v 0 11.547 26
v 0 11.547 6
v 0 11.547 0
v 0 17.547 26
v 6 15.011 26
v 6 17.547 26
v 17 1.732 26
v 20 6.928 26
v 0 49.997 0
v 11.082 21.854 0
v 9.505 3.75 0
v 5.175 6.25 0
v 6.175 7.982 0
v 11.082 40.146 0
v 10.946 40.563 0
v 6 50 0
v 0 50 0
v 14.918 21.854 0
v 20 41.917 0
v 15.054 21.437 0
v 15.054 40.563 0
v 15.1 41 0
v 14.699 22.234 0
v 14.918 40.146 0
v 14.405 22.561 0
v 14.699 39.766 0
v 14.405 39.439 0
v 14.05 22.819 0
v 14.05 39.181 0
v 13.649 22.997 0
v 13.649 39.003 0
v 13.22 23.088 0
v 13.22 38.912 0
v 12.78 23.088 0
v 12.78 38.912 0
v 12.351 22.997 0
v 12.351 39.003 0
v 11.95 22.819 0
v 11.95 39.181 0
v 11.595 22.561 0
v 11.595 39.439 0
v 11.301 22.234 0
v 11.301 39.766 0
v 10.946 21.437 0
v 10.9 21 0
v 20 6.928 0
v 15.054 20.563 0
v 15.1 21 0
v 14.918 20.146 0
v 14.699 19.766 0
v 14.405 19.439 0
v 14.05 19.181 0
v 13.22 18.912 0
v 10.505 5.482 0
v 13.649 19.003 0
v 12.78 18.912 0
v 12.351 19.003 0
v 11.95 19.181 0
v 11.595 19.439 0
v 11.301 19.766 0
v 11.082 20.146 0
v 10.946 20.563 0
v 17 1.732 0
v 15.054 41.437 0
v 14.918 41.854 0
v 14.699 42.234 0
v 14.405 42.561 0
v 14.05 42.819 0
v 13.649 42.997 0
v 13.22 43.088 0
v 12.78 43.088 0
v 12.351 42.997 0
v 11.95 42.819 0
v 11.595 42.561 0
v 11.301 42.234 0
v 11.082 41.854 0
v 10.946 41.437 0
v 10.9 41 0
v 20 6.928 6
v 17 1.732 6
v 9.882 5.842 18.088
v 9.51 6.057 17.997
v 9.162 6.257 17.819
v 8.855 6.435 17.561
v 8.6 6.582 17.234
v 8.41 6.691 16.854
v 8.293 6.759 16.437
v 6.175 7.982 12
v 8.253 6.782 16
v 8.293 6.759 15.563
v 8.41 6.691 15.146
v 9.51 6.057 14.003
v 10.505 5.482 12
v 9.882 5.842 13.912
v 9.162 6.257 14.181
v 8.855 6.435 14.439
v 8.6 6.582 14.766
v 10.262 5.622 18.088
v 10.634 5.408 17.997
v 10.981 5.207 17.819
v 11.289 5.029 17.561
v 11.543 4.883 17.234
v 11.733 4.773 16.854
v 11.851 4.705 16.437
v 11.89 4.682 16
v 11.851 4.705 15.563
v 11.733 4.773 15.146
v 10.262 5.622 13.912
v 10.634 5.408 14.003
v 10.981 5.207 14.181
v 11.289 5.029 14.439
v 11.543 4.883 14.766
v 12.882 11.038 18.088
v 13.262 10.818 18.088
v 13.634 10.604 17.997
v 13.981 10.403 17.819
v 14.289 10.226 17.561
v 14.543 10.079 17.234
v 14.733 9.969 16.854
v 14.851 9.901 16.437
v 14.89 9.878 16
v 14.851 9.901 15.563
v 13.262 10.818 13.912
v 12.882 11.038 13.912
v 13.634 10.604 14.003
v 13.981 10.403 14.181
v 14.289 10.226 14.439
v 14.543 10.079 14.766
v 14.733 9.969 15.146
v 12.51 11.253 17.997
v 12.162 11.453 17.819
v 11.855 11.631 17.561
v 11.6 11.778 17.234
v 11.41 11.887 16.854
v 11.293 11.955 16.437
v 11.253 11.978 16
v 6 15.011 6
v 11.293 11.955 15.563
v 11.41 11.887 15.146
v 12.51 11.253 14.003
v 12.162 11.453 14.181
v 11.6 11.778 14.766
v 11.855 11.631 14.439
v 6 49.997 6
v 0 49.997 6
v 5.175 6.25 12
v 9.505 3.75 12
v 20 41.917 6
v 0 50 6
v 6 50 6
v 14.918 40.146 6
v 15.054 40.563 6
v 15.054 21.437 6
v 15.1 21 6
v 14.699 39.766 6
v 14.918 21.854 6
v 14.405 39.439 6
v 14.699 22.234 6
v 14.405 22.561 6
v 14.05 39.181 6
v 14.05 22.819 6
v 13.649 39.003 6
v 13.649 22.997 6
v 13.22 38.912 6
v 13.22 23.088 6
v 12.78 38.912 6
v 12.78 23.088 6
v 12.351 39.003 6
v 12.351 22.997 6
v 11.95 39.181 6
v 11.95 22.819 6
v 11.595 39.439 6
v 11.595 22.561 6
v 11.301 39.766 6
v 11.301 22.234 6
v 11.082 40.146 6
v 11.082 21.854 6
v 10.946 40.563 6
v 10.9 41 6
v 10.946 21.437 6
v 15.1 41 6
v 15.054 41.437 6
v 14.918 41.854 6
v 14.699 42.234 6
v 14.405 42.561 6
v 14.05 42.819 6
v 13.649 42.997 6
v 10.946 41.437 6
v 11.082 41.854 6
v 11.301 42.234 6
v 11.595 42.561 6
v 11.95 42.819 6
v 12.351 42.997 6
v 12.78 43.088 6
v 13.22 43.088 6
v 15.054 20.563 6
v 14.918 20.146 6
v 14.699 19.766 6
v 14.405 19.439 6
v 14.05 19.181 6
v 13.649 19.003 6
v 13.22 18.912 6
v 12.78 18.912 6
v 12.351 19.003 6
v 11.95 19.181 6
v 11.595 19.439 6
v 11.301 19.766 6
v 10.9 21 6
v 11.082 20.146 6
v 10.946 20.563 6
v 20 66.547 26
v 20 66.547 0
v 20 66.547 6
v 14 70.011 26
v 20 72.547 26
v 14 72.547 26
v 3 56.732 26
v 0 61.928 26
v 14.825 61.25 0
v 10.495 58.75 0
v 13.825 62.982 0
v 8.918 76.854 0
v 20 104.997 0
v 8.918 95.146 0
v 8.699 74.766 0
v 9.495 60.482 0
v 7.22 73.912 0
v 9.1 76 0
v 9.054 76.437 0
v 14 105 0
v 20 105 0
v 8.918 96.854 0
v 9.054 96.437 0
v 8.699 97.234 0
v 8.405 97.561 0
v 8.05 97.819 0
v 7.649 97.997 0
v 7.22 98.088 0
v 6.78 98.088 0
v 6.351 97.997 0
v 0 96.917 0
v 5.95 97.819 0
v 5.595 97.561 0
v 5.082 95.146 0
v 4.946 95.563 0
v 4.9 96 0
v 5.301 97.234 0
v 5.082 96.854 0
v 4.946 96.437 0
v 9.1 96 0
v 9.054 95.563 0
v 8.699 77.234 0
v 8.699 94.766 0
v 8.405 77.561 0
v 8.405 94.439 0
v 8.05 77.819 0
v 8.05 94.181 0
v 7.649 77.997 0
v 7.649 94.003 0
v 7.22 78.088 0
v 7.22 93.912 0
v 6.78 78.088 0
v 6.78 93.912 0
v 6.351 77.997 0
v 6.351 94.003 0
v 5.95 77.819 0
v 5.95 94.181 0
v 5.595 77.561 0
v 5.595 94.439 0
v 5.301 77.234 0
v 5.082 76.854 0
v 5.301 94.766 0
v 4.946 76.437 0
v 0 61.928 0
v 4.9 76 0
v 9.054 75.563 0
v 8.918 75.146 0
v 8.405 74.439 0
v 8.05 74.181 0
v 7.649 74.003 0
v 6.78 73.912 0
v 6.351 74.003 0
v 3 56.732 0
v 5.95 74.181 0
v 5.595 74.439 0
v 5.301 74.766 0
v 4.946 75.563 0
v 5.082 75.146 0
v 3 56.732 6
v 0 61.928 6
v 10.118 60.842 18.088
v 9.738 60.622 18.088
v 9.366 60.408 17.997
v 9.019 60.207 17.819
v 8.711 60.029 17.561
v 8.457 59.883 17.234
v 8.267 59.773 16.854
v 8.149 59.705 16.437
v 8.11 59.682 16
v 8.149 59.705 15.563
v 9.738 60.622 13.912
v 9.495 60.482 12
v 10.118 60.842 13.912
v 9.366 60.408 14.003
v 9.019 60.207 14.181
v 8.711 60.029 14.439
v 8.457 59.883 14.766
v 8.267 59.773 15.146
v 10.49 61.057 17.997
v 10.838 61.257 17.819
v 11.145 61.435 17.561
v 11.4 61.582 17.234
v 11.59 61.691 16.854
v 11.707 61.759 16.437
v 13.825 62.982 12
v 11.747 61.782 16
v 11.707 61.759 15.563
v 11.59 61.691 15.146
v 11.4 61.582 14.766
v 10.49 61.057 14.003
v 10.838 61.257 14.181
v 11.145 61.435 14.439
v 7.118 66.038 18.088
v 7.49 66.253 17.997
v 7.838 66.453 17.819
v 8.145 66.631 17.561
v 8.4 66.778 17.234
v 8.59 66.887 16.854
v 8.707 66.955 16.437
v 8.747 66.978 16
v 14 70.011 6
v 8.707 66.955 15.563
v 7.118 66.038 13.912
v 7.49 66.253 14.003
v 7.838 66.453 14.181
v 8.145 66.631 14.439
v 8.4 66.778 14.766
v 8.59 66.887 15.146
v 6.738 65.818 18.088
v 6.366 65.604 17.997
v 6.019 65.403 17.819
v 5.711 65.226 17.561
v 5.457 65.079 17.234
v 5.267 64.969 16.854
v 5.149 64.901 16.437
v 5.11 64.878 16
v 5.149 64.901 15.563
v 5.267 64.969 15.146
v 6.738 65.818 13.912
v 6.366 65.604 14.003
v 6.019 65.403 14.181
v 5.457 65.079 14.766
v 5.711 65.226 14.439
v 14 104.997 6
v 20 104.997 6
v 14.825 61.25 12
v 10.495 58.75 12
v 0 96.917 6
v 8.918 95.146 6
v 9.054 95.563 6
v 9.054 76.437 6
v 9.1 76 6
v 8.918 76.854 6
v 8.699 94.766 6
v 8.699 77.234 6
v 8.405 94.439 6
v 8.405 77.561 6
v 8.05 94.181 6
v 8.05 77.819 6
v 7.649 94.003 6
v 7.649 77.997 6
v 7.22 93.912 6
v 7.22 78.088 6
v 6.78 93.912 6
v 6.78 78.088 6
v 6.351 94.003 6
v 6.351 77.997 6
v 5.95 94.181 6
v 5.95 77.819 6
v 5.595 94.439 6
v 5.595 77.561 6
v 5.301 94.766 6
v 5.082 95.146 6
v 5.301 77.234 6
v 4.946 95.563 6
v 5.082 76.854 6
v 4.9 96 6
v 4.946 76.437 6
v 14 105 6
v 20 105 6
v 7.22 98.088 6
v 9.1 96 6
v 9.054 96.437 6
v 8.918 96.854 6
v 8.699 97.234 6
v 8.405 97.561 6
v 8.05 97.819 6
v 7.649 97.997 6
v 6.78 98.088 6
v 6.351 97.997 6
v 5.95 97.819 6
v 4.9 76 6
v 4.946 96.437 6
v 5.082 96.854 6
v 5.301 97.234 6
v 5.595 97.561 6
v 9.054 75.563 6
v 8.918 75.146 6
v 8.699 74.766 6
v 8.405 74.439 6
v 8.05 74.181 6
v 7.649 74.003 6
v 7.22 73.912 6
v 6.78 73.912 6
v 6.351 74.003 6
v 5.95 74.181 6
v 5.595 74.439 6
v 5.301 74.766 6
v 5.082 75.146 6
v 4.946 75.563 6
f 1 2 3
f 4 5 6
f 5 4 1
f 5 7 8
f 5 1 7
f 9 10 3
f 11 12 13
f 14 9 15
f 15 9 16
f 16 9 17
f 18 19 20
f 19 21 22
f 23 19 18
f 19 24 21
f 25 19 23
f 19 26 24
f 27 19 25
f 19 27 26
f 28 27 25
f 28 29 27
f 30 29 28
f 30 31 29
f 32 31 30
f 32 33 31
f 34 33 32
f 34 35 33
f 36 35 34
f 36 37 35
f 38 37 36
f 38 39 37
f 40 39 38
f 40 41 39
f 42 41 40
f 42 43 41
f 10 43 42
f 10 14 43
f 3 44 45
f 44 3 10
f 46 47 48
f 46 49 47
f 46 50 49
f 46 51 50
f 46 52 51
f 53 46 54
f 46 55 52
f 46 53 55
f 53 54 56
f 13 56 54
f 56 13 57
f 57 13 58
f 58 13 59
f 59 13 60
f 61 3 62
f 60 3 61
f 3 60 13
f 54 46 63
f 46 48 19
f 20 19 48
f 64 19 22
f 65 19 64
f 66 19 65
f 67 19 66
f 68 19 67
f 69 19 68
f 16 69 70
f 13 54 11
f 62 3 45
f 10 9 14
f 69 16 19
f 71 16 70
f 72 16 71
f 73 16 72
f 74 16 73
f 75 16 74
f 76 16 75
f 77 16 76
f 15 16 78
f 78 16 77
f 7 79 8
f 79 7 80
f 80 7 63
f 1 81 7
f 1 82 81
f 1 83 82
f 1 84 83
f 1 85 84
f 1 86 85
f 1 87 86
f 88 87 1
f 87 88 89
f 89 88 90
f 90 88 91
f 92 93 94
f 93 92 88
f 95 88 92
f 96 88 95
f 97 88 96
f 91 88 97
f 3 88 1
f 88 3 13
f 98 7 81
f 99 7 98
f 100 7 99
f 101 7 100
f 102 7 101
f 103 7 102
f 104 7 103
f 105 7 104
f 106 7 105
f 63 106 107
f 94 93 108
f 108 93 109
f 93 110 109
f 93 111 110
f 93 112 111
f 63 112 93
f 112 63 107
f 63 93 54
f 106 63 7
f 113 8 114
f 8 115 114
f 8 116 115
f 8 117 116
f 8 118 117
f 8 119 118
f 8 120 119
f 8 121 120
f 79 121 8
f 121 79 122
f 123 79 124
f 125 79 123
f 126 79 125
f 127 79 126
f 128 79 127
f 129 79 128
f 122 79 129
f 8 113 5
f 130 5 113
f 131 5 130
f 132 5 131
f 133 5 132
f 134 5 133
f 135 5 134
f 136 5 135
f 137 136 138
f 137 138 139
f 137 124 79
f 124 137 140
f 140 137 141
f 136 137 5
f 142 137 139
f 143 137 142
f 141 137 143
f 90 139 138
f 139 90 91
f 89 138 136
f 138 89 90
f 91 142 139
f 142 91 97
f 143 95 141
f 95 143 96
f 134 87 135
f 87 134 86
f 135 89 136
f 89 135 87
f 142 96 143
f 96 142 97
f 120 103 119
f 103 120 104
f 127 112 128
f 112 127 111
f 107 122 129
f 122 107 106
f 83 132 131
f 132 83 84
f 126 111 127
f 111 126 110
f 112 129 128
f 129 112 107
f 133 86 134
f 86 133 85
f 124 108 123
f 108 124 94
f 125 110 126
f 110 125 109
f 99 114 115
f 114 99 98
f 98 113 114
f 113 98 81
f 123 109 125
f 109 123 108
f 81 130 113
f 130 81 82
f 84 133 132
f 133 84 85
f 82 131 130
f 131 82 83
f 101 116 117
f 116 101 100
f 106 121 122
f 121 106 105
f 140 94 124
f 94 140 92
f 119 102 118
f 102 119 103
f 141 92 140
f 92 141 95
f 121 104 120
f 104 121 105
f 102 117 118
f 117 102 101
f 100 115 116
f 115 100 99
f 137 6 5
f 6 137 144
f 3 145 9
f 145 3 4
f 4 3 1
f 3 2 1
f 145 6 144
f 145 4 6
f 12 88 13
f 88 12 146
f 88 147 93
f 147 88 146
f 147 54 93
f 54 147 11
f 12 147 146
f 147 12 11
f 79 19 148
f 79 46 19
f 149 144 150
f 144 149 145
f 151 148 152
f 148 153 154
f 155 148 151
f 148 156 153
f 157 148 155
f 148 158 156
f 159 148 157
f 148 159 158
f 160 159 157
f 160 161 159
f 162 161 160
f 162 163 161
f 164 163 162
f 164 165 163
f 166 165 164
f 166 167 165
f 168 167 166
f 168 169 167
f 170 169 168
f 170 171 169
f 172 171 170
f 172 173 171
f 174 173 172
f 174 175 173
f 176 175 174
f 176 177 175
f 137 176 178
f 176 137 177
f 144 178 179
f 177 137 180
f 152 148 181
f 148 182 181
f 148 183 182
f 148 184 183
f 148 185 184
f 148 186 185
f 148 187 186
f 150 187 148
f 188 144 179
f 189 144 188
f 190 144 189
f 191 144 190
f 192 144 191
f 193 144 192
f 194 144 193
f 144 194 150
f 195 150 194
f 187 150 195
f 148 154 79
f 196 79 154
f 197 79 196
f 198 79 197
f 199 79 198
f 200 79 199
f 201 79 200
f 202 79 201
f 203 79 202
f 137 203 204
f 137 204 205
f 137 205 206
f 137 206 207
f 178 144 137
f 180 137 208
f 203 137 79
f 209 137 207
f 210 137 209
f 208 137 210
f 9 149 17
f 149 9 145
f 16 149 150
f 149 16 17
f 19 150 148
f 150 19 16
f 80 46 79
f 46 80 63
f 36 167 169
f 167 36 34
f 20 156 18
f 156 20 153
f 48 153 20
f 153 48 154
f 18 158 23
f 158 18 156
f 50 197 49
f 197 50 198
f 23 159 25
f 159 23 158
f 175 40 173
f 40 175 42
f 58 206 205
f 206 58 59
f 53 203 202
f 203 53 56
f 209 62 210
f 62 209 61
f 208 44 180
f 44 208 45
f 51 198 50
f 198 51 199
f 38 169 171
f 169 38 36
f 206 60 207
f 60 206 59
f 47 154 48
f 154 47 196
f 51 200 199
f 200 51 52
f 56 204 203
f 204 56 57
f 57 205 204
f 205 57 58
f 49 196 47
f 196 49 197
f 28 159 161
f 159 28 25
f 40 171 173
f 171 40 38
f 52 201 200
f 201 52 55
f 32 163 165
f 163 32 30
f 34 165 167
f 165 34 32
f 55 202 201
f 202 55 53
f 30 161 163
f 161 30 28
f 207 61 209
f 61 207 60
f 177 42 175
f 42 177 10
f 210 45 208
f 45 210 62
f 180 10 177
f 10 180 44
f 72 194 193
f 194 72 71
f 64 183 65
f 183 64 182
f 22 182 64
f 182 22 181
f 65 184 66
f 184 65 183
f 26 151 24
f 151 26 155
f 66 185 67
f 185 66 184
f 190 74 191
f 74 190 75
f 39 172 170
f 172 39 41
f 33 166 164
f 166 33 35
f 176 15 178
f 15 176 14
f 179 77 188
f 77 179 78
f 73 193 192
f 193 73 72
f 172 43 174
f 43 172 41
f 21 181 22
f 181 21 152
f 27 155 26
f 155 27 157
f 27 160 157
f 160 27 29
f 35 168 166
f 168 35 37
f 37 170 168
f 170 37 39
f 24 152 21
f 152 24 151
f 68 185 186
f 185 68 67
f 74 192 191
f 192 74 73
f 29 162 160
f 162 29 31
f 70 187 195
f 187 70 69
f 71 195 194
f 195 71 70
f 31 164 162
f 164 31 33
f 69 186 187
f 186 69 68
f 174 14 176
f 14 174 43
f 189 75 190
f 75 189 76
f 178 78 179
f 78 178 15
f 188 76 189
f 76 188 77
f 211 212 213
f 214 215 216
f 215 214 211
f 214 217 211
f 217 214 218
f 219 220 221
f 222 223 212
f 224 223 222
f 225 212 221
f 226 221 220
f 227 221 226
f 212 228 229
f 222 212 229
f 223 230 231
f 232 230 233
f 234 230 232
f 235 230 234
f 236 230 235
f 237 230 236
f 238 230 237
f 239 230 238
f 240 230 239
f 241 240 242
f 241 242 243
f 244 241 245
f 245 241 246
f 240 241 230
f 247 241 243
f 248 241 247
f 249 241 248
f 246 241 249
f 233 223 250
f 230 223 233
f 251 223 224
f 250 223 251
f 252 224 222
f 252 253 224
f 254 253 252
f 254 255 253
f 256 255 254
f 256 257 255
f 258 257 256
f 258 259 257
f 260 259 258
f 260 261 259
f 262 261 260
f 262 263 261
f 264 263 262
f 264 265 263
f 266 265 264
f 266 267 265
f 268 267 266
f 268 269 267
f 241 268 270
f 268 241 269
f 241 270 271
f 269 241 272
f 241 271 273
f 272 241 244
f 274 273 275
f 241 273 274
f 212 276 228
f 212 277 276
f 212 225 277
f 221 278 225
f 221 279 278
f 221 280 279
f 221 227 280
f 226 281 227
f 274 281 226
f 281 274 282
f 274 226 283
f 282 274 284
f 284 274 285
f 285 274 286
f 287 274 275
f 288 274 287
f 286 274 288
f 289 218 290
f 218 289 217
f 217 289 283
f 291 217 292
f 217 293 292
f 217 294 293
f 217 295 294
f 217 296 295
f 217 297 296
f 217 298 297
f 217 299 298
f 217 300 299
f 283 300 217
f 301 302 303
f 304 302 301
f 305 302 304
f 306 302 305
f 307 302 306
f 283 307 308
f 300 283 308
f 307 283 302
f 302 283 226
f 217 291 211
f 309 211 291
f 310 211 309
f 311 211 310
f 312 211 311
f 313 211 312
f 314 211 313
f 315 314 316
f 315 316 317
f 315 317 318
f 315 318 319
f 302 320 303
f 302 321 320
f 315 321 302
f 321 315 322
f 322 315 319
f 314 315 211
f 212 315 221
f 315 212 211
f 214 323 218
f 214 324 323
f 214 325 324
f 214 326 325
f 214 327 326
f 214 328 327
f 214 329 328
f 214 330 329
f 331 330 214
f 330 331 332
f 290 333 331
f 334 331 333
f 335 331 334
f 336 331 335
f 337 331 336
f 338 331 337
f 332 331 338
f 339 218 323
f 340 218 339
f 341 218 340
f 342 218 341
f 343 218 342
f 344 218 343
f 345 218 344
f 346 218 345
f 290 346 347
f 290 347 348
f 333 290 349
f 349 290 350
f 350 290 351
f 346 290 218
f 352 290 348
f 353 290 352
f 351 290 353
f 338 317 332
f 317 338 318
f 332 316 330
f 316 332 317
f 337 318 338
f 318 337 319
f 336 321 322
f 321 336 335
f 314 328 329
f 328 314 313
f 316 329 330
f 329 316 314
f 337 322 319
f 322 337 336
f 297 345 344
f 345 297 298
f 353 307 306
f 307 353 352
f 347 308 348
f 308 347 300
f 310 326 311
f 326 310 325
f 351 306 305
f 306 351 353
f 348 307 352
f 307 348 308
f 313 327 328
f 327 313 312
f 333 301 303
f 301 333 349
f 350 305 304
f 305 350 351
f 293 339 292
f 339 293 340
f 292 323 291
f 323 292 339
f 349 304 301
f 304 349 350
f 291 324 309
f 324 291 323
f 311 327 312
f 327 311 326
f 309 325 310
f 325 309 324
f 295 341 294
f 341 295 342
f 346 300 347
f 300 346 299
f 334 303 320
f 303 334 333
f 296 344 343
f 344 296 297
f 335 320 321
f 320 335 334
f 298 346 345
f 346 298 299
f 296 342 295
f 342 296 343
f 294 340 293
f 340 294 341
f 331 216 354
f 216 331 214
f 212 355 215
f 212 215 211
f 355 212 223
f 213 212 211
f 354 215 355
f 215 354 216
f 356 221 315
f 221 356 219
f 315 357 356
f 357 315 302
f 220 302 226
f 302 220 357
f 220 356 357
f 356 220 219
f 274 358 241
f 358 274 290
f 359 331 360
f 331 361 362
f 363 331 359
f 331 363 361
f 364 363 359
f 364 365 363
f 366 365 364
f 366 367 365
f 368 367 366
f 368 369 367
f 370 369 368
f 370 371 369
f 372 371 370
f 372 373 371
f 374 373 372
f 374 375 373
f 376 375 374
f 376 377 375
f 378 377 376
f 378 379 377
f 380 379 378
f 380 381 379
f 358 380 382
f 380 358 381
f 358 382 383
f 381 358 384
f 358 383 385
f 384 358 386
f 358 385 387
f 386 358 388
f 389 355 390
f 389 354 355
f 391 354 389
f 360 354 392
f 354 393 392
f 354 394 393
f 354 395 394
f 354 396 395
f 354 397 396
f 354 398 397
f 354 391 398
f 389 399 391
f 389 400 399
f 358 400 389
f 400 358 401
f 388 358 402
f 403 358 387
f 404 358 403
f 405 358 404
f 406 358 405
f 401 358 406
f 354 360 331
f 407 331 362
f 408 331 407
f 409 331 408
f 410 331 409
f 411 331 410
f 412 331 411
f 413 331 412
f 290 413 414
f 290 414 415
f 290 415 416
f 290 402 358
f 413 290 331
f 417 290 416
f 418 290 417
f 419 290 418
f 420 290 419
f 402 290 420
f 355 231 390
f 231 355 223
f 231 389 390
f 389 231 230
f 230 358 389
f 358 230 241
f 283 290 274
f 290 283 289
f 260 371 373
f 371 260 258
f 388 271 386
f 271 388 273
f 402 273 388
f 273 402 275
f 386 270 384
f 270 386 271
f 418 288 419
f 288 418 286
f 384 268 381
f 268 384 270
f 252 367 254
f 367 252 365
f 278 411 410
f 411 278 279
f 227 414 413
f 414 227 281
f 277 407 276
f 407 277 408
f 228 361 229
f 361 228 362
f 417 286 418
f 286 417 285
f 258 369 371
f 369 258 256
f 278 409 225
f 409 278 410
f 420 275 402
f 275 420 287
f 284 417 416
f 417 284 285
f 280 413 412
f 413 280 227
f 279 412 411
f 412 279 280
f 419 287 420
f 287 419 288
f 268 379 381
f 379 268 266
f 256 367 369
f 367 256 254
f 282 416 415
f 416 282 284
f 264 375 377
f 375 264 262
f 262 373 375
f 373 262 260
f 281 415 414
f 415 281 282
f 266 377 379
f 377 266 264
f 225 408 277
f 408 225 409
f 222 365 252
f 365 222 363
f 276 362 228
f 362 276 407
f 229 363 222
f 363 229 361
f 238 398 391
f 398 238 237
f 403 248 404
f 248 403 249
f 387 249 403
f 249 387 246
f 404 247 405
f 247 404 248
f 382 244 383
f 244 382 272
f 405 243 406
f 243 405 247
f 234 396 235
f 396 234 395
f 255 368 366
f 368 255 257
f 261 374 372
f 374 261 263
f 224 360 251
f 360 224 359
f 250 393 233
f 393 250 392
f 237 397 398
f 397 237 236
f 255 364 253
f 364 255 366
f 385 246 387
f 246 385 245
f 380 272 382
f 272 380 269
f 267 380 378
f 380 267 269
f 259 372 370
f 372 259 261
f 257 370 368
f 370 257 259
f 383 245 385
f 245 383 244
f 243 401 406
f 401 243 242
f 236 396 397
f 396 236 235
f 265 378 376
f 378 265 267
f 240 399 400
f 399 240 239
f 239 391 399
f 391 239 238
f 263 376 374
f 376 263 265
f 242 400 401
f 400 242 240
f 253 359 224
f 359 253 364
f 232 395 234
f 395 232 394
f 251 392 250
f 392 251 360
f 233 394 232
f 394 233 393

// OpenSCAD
// file: functions.scad
// PRUSA Mendel  
// Functions used in many files
// GNU GPL v2
// Josef Průša
// josefprusa@me.com
// prusadjs.cz
// http://www.reprap.org/wiki/Prusa_Mendel
// http://github.com/prusajr/PrusaMendel

module nut(d,h,horizontal=true){
cornerdiameter =  (d / 2) / cos (180 / 6);
cylinder(h = h, r = cornerdiameter, $fn = 6);
if(horizontal){
for(i = [1:6]){
	rotate([0,0,60*i]) translate([-cornerdiameter-0.2,0,0]) rotate([0,0,-45]) cube(size = [2,2,h]);
}}
}

// By nophead
module polyhole(d,h) {
    n = max(round(2 * d),3);
    rotate([0,0,180])
        cylinder(h = h, r = (d / 2) / cos (180 / n), $fn = n);
}

module roundcorner(diameter){
	difference(){
		cube(size = [diameter,diameter,99], center = false);
		translate(v = [diameter, diameter, 0]) cylinder(h = 100, r=diameter, center=true);
	}
}
// file: metric.scad
// PRUSA Mendel  
// Default metric sizes
// GNU GPL v2
// Josef Průša
// josefprusa@me.com
// prusadjs.cz
// http://www.reprap.org/wiki/Prusa_Mendel
// http://github.com/prusajr/PrusaMendel

// DONT CHANGE THIS FILE! ALTER VALUES IN CONFIGURATION.SCAD INSTEAD

// RODS

threaded_rod_diameter = 8;
threaded_rod_diameter_horizontal = 8;
smooth_bar_diameter = 8;
smooth_bar_diameter_horizontal = 8;

// Nuts and bolts

m8_diameter = 8;
m8_nut_diameter = 14.5;

m4_diameter = 4;
m4_nut_diameter = 7.5;

m3_diameter = 3;
m3_nut_diameter = 5;

// Bushing holder

bushing_core_diameter = smooth_bar_diameter;
bushing_material_thickness = 1;

// Motors

motor_shaft = 5.1;
// file: configuration.scad
// PRUSA Mendel  
// Configuration file
// GNU GPL v2
// Josef Průša
// josefprusa@me.com
// prusadjs.cz
// http://www.reprap.org/wiki/Prusa_Mendel
// http://github.com/prusajr/PrusaMendel

// PLEASE SELECT ONE OF THE CONFIGURATIONS BELOW
// BY UN-COMMENTING IT

// Uncomment for metric settings
// METRIC METRIC METRIC METRIC METRIC METRIC METRIC METRIC 

include <metric.scad>;

// Uncomment for imperial settings
// IMPERIAL IMPERIAL IMPERIAL IMPERIAL IMPERIAL IMPERIAL IMPERIAL 

//include <sae.scad>;

//thin_wall = 3;
// LM8UU
//linear = false;

// override settings by customizing below
// CUSTOM CUSTOM CUSTOM CUSTOM CUSTOM CUSTOM CUSTOM CUSTOM CUSTOM

threaded_rod_diameter = 8.2;
threaded_rod_diameter_horizontal = 8.2;
smooth_bar_diameter = 8.3;
smooth_bar_diameter_horizontal = 8.3;

// Nuts and bolts

m8_diameter = 8.3;
m8_nut_diameter = 15;

m4_diameter = 4.2;
m4_nut_diameter = 9;

m3_diameter = 3.3;
m3_nut_diameter = 5.8;

///counted stuff
m3_nut_diameter_bigger = ((m3_nut_diameter  / 2) / cos (180 / 6))*2;

// functions 
include <functions.scad>
// main file
// C. Strang		
// cstrang@????
// funfor.us

include <configuration.scad>;

thickness = 6;   // wall and base thickness
slottabs = 2;    // Slot depth (2 is normal) -1 to remove tabs
holes = m4_diameter;  //m3, m4 or m5=5.1
o = 0.01;						// overlap amount for error-free STLs

$fn=30;

for (x = [0])
{
	translate([(x*25),0,0]) prism60inside(thickness,slottabs,holes);
	translate([20+(x*25),55,0]) mirror() prism60inside(thickness,slottabs,holes);
}

module prism60inside(th,st,hs)
{
	translate([20,(th/cos(30)),0]) rotate([0,0,150]) walls(th,st,hs);
	base(th,hs);
}

module walls(wth,wst,whs)
{
	an=atan((20)/(50-11.55-wth));
	ln=(20/cos(30))-(wth*tan(30));
	echo(ln);
	translate([7.5,wth-o,0]) cube([5,wst+o,12]);

	difference()
	{
		cube([ln,wth,20+wth]);
		translate([8,-0.1,16]) rotate([-90,0,0]) cylinder(r=whs/2,h=7);
	}

	translate([ln,wth,0,]) rotate([0,0,210]) difference()
	{
		cube([wth,(50-11.55),20+wth]);
		translate([-o,(50-11.55),wth]) rotate([-an,0,0]) mirror([0,1,0]) cube([wth+2*o,50,20+wth]);
	}

}


module base(bth,bhs)
{
	trn = 20-((bth/cos(30))*tan(30));
	difference()
		{
			cube([20,50,bth]);
			translate([20,0,-o]) rotate([0,0,-30]) mirror([1,1,0]) cube([10,25,bth+2*o]);
			translate([bth,50,-o]) rotate([0,0,-120]) mirror([1,0,0]) cube([10,25,bth+2*o]);

			translate([trn,0,-o]) rotate([0,0,-30]) cube([10,15,6.5]);
			translate([13,15+bth,-o]) cylinder(r=bhs/2,h=bth+2*o);
			translate([13,35+bth,-o]) cylinder(r=bhs/2,h=bth+2*o);
		}
}
